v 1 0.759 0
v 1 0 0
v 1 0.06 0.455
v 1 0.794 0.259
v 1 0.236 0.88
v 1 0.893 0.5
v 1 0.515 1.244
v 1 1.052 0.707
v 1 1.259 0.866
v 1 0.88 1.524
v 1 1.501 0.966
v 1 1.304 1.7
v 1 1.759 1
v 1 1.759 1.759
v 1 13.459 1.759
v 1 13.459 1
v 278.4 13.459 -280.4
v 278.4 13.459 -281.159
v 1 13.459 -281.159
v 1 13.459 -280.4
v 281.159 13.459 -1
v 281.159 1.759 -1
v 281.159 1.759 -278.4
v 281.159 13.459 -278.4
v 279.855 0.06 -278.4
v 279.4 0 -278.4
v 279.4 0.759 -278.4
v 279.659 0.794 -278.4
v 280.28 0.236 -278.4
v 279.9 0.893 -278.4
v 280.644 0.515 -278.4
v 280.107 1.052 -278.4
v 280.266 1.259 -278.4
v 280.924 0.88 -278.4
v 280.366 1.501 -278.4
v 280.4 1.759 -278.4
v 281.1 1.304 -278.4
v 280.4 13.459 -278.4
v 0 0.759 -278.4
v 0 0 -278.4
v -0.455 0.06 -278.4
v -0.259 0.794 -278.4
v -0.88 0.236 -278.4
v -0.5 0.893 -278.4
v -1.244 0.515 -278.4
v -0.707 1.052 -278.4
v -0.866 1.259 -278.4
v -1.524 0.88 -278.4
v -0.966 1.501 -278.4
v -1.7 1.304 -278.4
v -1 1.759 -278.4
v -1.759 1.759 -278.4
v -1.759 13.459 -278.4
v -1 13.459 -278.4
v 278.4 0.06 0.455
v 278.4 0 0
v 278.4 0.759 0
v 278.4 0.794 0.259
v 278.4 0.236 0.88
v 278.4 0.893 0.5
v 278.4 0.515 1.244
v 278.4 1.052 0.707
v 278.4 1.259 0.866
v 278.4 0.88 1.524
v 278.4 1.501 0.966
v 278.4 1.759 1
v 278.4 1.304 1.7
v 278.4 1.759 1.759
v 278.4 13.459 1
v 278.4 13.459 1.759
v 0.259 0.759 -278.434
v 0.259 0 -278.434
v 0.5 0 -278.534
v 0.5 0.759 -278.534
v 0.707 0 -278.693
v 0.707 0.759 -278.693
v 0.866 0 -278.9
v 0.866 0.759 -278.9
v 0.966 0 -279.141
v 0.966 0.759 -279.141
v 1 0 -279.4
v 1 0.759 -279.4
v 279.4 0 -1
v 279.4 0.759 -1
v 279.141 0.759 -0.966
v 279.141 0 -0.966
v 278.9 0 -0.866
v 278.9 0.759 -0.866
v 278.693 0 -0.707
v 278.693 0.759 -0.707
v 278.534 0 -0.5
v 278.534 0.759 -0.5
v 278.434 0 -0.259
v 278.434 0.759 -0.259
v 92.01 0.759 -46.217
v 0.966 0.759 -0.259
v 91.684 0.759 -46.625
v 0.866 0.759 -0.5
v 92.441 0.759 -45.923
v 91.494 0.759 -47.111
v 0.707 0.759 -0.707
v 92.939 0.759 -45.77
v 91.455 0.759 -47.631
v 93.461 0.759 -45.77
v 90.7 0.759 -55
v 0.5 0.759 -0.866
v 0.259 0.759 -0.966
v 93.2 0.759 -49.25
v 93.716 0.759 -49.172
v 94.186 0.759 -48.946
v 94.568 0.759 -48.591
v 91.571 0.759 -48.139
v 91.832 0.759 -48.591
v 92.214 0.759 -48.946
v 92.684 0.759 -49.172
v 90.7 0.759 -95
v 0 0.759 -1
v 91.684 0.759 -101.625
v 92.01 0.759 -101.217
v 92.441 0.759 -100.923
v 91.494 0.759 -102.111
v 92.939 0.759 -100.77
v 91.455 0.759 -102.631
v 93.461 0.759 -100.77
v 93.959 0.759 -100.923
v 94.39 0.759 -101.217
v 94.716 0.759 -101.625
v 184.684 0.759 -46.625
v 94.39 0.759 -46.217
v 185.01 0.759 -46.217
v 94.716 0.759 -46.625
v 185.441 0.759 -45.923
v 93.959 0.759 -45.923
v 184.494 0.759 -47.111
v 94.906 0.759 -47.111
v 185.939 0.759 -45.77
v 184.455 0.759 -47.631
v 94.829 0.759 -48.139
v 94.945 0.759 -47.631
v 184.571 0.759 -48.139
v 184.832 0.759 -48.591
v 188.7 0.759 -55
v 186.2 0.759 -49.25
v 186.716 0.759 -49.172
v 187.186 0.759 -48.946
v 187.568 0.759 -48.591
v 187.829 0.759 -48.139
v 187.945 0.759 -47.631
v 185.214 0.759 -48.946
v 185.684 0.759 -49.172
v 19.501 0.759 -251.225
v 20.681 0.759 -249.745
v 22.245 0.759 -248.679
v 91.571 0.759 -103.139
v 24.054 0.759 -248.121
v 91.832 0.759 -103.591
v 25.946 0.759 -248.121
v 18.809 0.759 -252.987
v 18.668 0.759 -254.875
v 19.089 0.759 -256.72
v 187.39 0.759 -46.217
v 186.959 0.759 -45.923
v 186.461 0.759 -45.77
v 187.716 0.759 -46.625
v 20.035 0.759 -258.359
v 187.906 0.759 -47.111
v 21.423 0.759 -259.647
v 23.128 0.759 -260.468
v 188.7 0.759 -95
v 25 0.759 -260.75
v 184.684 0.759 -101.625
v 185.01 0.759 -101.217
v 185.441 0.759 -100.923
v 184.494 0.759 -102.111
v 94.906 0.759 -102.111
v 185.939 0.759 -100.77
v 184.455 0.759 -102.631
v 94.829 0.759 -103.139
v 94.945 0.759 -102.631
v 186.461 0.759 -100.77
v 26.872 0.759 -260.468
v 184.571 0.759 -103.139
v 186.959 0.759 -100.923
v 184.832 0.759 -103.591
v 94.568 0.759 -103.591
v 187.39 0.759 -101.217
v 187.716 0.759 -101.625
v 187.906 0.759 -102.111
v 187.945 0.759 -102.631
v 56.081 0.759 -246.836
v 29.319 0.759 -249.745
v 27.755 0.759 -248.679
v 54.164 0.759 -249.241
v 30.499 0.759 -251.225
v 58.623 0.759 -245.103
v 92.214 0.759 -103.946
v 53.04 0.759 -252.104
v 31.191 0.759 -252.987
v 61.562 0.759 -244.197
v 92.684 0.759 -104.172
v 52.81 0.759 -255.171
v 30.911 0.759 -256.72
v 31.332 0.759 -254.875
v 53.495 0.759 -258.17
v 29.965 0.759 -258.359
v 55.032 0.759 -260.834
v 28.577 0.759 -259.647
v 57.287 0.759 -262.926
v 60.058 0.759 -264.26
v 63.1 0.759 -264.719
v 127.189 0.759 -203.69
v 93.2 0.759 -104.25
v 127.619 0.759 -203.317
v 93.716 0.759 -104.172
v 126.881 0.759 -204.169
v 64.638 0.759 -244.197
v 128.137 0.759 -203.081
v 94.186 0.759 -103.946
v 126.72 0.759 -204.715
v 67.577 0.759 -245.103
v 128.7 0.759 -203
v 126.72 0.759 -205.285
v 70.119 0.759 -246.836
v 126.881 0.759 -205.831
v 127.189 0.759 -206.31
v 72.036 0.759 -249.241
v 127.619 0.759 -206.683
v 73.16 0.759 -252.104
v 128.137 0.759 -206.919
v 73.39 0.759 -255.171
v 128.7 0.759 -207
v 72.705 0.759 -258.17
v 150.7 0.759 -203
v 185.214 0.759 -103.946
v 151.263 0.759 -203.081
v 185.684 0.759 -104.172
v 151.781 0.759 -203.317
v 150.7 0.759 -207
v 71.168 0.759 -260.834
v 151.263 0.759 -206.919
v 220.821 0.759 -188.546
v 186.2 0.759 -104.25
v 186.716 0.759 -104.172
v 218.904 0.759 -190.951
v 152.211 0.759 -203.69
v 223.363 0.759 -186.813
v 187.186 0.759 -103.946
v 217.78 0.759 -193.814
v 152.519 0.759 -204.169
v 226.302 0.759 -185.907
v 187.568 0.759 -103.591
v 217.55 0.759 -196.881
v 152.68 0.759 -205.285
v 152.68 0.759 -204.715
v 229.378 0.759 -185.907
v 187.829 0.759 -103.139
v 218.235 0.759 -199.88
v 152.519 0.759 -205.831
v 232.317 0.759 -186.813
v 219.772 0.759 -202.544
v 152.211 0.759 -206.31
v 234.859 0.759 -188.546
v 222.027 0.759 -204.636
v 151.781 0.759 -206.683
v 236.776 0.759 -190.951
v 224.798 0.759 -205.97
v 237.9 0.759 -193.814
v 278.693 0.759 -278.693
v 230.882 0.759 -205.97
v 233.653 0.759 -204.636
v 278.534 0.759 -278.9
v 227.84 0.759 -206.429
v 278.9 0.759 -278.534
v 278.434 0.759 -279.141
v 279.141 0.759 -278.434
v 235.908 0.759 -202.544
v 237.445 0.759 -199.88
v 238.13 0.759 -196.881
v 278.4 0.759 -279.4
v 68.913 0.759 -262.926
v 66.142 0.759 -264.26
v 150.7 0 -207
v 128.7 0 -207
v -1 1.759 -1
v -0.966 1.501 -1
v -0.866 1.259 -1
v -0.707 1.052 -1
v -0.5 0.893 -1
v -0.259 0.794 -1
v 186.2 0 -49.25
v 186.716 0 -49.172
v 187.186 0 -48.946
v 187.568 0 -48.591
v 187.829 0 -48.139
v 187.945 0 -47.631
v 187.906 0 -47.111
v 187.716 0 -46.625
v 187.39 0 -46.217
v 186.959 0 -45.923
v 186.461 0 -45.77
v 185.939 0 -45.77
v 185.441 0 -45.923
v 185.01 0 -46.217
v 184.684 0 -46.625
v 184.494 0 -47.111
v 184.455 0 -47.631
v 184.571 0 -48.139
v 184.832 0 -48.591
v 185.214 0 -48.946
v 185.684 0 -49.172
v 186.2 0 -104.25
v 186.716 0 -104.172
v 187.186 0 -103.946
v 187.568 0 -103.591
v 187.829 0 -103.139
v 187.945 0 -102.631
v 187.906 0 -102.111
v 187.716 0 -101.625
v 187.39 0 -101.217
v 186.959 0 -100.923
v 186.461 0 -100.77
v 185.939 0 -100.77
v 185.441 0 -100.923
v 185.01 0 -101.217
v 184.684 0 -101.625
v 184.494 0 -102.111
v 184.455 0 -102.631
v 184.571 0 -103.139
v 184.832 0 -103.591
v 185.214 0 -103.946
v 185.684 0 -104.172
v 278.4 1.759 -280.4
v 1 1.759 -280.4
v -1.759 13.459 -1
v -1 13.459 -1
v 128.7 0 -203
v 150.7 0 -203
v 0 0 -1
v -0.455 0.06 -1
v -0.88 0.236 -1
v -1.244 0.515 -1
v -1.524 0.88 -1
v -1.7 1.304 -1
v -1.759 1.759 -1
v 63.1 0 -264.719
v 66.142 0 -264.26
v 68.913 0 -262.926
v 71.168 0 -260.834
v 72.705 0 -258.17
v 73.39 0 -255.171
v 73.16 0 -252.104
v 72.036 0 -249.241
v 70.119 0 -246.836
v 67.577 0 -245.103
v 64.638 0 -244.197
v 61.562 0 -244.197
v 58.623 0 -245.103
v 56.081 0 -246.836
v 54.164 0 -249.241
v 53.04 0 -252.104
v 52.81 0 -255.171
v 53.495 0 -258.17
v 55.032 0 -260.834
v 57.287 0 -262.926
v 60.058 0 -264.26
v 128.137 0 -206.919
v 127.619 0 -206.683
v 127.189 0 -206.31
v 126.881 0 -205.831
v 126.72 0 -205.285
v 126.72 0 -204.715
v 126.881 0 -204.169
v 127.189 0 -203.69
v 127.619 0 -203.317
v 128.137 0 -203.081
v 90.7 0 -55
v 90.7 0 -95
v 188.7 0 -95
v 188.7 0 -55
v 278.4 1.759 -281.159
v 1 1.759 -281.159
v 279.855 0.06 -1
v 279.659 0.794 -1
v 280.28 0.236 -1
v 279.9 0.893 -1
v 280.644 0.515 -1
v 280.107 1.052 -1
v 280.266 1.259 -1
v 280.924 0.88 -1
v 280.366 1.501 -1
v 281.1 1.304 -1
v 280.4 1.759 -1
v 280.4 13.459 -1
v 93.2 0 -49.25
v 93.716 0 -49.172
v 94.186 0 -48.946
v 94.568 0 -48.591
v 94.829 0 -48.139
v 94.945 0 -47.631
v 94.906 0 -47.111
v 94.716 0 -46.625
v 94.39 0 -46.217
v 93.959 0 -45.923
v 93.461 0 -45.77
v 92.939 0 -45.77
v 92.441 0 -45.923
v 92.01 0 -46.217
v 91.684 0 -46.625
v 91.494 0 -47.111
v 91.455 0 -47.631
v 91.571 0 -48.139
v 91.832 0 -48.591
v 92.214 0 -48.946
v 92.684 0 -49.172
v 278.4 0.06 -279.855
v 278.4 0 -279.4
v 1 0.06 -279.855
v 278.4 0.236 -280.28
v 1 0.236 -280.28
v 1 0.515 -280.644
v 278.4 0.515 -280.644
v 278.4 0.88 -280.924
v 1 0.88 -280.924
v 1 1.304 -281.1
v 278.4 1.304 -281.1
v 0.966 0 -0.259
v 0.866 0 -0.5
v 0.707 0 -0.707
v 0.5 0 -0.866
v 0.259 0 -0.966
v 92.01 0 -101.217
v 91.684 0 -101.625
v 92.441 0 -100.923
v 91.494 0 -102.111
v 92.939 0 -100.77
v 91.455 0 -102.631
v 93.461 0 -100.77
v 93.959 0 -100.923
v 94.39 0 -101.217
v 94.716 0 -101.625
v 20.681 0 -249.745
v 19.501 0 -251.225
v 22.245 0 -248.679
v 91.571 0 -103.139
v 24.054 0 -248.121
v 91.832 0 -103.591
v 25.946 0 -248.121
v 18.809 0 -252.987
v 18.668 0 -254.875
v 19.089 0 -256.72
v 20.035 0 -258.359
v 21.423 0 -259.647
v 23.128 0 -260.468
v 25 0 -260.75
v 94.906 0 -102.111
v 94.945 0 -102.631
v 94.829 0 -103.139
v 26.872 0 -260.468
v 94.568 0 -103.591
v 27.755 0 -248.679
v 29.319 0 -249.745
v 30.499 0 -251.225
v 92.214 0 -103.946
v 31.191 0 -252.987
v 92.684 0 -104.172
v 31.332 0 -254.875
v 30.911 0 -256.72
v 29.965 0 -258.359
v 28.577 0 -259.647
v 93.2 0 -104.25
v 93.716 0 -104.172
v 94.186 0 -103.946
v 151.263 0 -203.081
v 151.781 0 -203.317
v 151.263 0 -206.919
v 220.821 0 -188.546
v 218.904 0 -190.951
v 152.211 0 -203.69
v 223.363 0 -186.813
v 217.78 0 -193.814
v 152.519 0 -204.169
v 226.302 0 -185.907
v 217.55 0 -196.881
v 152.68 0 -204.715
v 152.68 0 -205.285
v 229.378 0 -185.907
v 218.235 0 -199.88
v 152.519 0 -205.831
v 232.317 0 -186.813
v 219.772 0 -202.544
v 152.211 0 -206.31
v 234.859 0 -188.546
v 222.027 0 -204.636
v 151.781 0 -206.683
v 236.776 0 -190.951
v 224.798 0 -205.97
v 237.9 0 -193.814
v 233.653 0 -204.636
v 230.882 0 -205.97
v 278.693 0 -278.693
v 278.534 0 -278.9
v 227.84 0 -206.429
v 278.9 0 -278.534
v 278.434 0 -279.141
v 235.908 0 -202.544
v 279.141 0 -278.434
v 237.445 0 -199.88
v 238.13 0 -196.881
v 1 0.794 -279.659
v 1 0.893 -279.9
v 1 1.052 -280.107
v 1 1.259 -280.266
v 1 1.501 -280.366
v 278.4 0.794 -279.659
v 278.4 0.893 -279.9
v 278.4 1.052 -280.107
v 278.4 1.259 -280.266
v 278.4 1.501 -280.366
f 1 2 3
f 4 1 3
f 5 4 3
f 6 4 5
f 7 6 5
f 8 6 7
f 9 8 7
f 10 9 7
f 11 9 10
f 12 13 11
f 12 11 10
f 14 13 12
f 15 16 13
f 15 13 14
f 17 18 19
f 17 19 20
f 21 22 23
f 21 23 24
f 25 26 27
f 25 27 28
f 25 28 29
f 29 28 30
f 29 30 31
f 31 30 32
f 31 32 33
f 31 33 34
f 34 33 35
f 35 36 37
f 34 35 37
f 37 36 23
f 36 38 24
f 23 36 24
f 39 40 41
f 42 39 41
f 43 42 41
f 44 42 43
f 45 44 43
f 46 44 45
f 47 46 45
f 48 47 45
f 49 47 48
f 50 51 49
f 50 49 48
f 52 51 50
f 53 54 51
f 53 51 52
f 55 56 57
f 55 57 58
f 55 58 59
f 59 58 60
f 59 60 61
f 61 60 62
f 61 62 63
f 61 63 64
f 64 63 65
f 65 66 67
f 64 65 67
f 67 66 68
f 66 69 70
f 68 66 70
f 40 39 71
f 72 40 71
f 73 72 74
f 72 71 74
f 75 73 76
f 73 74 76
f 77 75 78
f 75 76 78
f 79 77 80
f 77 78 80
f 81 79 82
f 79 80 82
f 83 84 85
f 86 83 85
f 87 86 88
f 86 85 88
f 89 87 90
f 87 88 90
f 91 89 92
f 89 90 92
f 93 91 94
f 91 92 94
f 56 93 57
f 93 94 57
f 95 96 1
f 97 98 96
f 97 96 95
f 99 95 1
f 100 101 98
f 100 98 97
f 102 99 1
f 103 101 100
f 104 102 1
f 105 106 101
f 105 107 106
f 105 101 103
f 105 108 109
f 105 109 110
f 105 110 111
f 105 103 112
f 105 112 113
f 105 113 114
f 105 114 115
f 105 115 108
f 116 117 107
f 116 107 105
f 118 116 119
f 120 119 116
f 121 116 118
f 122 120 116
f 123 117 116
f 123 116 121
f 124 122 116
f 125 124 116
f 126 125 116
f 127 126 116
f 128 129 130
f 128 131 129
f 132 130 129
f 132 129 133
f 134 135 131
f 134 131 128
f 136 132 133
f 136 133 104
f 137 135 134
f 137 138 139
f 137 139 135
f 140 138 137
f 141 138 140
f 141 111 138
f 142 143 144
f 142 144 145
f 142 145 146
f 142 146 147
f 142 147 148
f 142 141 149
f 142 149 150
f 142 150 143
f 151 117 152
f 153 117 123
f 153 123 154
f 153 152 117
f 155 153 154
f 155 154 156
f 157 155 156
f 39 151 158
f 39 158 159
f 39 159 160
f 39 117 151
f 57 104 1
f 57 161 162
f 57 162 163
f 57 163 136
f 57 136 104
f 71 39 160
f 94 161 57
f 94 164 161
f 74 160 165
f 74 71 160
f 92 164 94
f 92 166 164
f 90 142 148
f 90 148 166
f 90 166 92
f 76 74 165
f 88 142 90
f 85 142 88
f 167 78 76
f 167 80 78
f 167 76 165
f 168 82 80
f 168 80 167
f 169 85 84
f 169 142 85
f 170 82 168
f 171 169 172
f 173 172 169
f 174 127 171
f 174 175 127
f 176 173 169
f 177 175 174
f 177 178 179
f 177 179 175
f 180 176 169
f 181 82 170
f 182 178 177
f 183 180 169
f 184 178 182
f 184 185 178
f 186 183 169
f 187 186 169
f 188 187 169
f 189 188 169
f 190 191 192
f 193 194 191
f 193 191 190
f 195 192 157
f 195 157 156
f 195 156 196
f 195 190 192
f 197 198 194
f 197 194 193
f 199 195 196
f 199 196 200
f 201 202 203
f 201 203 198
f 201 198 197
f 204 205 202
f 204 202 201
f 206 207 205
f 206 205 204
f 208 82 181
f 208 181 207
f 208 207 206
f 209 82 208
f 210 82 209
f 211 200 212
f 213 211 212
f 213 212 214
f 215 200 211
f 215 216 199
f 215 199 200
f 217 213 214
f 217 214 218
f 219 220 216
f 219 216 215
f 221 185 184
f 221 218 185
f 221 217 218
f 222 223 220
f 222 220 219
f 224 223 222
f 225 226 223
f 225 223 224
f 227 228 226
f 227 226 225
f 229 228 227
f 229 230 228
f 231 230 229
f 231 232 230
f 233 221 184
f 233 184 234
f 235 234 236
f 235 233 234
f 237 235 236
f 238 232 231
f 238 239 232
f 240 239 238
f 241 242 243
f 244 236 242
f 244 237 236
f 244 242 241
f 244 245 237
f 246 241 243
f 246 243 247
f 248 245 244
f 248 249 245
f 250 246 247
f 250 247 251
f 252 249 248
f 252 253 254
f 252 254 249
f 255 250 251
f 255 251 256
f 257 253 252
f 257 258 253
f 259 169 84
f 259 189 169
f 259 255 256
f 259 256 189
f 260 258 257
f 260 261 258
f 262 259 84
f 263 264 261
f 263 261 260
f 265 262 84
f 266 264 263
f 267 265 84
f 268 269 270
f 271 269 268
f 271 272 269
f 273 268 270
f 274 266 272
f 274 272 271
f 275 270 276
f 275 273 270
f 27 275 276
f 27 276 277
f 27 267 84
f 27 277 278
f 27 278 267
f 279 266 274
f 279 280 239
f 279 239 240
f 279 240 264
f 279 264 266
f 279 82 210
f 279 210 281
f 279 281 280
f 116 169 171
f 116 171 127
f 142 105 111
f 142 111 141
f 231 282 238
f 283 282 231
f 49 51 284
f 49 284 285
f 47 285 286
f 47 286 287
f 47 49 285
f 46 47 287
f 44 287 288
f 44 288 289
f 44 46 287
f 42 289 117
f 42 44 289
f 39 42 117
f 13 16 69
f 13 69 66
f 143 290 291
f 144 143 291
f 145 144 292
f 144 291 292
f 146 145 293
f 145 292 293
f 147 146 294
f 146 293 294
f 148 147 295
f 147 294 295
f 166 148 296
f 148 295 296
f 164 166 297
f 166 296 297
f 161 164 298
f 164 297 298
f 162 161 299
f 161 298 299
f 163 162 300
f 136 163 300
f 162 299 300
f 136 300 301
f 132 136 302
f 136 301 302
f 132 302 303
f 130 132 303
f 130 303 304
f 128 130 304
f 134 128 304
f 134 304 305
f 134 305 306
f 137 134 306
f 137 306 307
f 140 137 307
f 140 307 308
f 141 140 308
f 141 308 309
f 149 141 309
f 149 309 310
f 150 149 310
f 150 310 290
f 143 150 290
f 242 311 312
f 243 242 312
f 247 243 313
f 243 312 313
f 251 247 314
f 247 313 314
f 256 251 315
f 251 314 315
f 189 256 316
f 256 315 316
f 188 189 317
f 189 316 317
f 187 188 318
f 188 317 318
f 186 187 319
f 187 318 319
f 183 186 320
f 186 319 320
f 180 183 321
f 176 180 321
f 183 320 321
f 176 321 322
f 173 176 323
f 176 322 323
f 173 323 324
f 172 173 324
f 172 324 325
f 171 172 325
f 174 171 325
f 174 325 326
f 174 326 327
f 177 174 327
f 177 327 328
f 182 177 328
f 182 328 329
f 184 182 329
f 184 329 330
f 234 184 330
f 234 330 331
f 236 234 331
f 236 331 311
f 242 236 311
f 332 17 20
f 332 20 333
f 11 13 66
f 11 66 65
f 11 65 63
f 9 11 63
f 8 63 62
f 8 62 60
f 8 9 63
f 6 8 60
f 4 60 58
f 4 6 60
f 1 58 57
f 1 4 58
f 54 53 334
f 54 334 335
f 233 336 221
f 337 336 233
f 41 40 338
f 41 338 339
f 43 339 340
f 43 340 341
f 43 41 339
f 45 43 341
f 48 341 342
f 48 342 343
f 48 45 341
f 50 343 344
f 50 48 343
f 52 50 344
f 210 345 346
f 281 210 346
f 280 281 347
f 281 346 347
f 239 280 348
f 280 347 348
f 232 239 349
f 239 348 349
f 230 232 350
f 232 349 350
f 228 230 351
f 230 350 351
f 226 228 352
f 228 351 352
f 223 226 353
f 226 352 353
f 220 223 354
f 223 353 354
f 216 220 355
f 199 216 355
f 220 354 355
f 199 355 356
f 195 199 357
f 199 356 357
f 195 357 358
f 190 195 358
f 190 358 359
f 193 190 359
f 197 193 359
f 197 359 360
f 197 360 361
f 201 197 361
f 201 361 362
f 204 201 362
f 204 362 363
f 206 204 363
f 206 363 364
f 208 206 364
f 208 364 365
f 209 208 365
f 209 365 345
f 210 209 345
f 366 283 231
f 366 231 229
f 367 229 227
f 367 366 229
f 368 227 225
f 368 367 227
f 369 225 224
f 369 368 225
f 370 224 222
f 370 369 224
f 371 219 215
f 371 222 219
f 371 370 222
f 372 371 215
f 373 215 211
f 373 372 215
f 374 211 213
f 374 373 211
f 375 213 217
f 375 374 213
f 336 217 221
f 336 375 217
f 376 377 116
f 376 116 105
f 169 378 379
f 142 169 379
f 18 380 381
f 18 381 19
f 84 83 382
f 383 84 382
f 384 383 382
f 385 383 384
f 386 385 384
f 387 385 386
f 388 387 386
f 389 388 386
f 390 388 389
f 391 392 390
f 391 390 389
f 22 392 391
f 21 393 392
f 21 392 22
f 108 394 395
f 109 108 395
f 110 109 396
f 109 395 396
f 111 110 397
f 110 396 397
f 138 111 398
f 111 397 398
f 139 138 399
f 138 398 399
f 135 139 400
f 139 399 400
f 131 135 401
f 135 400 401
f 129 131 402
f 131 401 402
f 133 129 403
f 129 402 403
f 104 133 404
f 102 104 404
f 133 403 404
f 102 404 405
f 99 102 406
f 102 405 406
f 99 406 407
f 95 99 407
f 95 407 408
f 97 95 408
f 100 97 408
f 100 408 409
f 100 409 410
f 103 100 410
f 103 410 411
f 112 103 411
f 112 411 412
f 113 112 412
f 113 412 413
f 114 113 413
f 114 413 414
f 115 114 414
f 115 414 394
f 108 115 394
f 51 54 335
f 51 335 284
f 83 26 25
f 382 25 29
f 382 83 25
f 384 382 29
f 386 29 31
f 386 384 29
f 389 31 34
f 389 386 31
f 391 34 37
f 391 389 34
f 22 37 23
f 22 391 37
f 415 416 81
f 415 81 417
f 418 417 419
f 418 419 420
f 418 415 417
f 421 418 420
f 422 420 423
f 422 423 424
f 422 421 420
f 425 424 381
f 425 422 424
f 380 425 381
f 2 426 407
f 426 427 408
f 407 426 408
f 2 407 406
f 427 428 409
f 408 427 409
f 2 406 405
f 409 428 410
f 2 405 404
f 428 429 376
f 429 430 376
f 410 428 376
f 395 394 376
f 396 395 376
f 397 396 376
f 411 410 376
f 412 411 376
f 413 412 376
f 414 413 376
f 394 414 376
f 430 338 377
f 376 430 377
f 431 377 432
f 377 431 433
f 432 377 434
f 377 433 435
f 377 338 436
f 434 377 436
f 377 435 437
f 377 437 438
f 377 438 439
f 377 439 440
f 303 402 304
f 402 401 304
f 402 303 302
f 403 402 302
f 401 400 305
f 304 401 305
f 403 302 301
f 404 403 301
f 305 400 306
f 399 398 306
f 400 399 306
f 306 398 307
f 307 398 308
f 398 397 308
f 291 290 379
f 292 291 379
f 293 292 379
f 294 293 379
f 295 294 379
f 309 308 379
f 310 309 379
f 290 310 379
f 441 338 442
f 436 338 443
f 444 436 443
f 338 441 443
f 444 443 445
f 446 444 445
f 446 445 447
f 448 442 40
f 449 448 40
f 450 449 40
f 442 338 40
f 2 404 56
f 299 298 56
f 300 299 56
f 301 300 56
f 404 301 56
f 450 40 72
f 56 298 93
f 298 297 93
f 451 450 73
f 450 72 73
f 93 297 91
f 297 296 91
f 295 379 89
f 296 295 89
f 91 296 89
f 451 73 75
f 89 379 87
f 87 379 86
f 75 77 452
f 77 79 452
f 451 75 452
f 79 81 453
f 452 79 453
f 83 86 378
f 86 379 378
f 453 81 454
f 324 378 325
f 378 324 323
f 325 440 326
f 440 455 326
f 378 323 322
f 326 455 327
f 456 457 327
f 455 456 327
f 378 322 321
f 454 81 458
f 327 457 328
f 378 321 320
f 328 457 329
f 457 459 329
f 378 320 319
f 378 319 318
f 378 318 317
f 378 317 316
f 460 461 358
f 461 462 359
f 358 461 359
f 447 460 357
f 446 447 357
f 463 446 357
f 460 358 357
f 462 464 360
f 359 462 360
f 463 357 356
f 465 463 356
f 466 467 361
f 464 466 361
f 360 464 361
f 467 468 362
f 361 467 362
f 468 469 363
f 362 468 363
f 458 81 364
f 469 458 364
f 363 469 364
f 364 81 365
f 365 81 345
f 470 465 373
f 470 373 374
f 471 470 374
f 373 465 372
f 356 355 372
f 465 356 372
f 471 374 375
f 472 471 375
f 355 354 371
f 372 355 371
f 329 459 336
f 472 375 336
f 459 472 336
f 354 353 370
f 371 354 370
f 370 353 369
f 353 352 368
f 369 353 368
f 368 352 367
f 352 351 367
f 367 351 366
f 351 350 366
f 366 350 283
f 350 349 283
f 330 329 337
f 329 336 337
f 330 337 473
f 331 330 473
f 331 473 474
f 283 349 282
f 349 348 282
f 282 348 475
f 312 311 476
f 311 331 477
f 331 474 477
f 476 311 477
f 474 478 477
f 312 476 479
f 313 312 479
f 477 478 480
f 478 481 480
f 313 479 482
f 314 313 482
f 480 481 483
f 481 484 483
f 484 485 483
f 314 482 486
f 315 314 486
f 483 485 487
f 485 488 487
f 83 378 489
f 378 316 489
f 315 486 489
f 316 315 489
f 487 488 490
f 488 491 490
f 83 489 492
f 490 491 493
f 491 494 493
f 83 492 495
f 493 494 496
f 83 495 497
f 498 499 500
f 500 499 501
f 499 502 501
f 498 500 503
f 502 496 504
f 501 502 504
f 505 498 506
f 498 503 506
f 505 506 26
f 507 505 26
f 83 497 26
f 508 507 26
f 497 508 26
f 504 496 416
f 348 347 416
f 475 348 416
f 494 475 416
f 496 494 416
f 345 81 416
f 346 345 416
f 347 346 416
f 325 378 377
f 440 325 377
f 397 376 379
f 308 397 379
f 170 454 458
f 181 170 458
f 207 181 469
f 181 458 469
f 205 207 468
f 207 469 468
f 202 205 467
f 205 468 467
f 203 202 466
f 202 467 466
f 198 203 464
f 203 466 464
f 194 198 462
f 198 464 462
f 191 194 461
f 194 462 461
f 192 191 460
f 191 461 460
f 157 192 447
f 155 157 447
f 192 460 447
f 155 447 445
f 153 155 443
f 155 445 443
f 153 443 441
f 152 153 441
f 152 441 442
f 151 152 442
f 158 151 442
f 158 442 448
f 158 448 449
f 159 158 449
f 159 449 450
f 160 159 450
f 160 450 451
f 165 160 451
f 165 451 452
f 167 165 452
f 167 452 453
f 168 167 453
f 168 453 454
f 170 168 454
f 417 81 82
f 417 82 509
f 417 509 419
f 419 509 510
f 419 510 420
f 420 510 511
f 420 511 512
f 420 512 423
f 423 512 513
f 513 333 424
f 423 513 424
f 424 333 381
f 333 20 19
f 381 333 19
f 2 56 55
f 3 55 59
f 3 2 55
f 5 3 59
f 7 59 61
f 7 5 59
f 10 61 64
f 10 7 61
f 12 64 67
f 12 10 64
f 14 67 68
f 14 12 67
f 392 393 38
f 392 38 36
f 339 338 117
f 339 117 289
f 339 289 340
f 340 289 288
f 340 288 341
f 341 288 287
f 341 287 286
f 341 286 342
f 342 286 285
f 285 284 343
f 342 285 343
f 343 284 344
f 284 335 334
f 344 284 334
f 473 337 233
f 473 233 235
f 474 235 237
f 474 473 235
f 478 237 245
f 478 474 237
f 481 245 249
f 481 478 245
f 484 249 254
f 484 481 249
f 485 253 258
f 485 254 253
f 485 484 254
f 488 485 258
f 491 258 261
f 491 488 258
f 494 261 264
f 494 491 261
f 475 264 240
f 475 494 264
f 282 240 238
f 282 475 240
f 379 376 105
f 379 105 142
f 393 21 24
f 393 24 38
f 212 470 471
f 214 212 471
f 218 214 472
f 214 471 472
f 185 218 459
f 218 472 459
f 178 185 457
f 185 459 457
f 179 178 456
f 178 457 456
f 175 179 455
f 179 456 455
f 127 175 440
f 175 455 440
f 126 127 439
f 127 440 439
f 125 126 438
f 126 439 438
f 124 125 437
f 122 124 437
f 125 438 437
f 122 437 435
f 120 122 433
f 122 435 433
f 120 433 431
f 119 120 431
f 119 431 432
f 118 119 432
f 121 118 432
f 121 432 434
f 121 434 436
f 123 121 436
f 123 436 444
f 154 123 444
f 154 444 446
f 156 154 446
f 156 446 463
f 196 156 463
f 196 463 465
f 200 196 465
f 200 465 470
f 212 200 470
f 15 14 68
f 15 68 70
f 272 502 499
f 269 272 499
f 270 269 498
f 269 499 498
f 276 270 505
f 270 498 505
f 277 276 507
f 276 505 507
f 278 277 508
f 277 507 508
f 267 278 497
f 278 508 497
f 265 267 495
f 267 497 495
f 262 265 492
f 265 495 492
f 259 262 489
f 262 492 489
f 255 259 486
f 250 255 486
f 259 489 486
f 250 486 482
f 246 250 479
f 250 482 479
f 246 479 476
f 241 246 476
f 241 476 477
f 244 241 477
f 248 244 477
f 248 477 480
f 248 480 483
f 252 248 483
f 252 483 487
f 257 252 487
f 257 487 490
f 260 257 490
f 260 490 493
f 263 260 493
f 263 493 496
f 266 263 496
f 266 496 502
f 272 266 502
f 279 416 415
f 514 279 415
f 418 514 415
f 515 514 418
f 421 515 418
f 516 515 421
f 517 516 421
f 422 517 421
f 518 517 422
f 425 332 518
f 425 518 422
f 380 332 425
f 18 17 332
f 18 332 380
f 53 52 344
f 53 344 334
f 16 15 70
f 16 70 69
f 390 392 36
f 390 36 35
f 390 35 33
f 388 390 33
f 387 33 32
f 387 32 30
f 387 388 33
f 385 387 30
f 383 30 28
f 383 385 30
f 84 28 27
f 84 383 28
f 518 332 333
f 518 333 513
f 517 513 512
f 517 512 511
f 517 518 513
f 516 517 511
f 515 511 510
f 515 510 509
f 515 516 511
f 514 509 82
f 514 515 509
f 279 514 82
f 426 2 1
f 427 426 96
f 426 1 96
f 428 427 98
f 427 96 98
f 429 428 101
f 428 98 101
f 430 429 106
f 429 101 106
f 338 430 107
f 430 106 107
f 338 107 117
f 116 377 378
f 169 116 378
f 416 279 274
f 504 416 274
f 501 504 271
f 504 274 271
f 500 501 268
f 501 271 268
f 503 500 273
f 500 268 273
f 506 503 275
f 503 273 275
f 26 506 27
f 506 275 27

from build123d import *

# Parameters (mm, degrees)
SKETCH1_W                 = 279.4
SKETCH1_H                 = 279.4
BASE_FLANGE1_DEPTH        = 0.75946
SKETCH4_R                 = 1
CUT_EXTRUDE1_DEPTH        = 396.131999184
EDGE_FLANGE1_DEPTH        = 277.4
EDGE_FLANGE1_BEND_DEPTH   = 277.4
EDGE_FLANGE1_BEND_2_DEPTH = 277.4
EDGE_FLANGE1_BEND_3_DEPTH = 277.4
CUT_EXTRUDE2_REACH        = 399.847
SKETCH17_R                = 6.35
SKETCH17_R_2              = 10.31875
SKETCH17_W                = 98
SKETCH17_H                = 40
SKETCH19_R                = 1.75
CUT_EXTRUDE4_DEPTH        = 398.847258327


# Sheet-metal steps are written as plain solids
with BuildPart() as part:
    # Sketch1 → Base-Flange1 (new body)
    with BuildSketch(Plane(origin=(0, 0, 0), x_dir=(1, 0, 0), z_dir=(0, 1, 0))):
        with Locations((139.7, 139.7)):
            Rectangle(SKETCH1_W, SKETCH1_H)
    extrude(amount=BASE_FLANGE1_DEPTH)

    # Sketch4 → Cut-Extrude1 (cut, through all)
    with BuildSketch(Plane(origin=(0, 0.75946, 0), x_dir=(1, 0, 0), z_dir=(0, 1, 0))):
        Circle(SKETCH4_R)
        with Locations((0, 279.4)):
            Circle(SKETCH4_R)
        with Locations((279.4, 279.4)):
            Circle(SKETCH4_R)
        with Locations((279.4, 0)):
            Circle(SKETCH4_R)
    extrude(amount=-CUT_EXTRUDE1_DEPTH, mode=Mode.SUBTRACT)

    # Edge-Flange1 section (across the edge) → Edge-Flange1 (add)
    with BuildSketch(Plane(origin=(278.4, 0.75946, -280.4), x_dir=(0, 0, 1), z_dir=(-1, 0, 0))):
        with BuildLine():
            Line((-0.75946, 1), (-0.75946, 12.7))
            Line((-0.75946, 12.7), (0, 12.7))
            Line((0, 12.7), (0, 1))
            ThreePointArc((0, 1), (0.292893219, 0.292893219), (1, 0))
            Line((1, 0), (1, -0.75946))
            ThreePointArc((1, -0.75946), (-0.244126097, -0.244126097), (-0.75946, 1))
        make_face()
    extrude(amount=EDGE_FLANGE1_DEPTH)

    # Edge-Flange1 section 2 (across the edge) → Edge-Flange1 bend (add)
    with BuildSketch(Plane(origin=(-1, 0.75946, -278.4), x_dir=(1, 0, 0), z_dir=(0, 0, 1))):
        with BuildLine():
            Line((-0.75946, 1), (-0.75946, 12.7))
            Line((-0.75946, 12.7), (0, 12.7))
            Line((0, 12.7), (0, 1))
            ThreePointArc((0, 1), (0.292893219, 0.292893219), (1, 0))
            Line((1, 0), (1, -0.75946))
            ThreePointArc((1, -0.75946), (-0.244126097, -0.244126097), (-0.75946, 1))
        make_face()
    extrude(amount=EDGE_FLANGE1_BEND_DEPTH)

    # Edge-Flange1 section 3 (across the edge) → Edge-Flange1 bend 2 (add)
    with BuildSketch(Plane(origin=(1, 0.75946, 1), x_dir=(0, 0, -1), z_dir=(1, 0, 0))):
        with BuildLine():
            Line((-0.75946, 1), (-0.75946, 12.7))
            Line((-0.75946, 12.7), (0, 12.7))
            Line((0, 12.7), (0, 1))
            ThreePointArc((0, 1), (0.292893219, 0.292893219), (1, 0))
            Line((1, 0), (1, -0.75946))
            ThreePointArc((1, -0.75946), (-0.244126097, -0.244126097), (-0.75946, 1))
        make_face()
    extrude(amount=EDGE_FLANGE1_BEND_2_DEPTH)

    # Edge-Flange1 section 4 (across the edge) → Edge-Flange1 bend 3 (add)
    with BuildSketch(Plane(origin=(280.4, 0.75946, -1), x_dir=(-1, 0, 0), z_dir=(0, 0, -1))):
        with BuildLine():
            Line((-0.75946, 1), (-0.75946, 12.7))
            Line((-0.75946, 12.7), (0, 12.7))
            Line((0, 12.7), (0, 1))
            ThreePointArc((0, 1), (0.292893219, 0.292893219), (1, 0))
            Line((1, 0), (1, -0.75946))
            ThreePointArc((1, -0.75946), (-0.244126097, -0.244126097), (-0.75946, 1))
        make_face()
    extrude(amount=EDGE_FLANGE1_BEND_3_DEPTH)

    # Sketch17 → Cut-Extrude2 (cut, up to next)
    with BuildSketch(Plane.XZ, mode=Mode.PRIVATE) as cut_extrude2_sk1:
        with Locations(Location((25, -254.4, 0), (0, 0, 270))):
            Circle(SKETCH17_R)
    cut_extrude2_tool1 = extrude(cut_extrude2_sk1.sketch, amount=-CUT_EXTRUDE2_REACH, mode=Mode.PRIVATE) & part.part
    # Sketch17 → Cut-Extrude2 (cut, up to next)
    with BuildSketch(Plane.XZ, mode=Mode.PRIVATE) as cut_extrude2_sk2:
        with Locations(Location((63.1, -254.4, 0), (0, 0, 270))):
            Circle(SKETCH17_R_2)
    cut_extrude2_tool2 = extrude(cut_extrude2_sk2.sketch, amount=-CUT_EXTRUDE2_REACH, mode=Mode.PRIVATE) & part.part
    # Sketch17 → Cut-Extrude2 (cut, up to next)
    with BuildSketch(Plane.XZ, mode=Mode.PRIVATE) as cut_extrude2_sk3:
        with Locations(Location((227.84, -196.11, 0), (0, 0, 270))):
            Circle(SKETCH17_R_2)
    cut_extrude2_tool3 = extrude(cut_extrude2_sk3.sketch, amount=-CUT_EXTRUDE2_REACH, mode=Mode.PRIVATE) & part.part
    # Sketch17 → Cut-Extrude2 (cut, up to next)
    with BuildSketch(Plane.XZ, mode=Mode.PRIVATE) as cut_extrude2_sk4:
        with Locations((139.7, -75)):
            Rectangle(SKETCH17_W, SKETCH17_H)
    cut_extrude2_tool4 = extrude(cut_extrude2_sk4.sketch, amount=-CUT_EXTRUDE2_REACH, mode=Mode.PRIVATE) & part.part
    # Sketch17 → Cut-Extrude2 (cut, up to next)
    with BuildSketch(Plane.XZ, mode=Mode.PRIVATE) as cut_extrude2_sk5:
        with BuildLine():
            Line((128.7, -203), (150.7, -203))
            ThreePointArc((150.7, -203), (152.7, -205), (150.7, -207))
            Line((150.7, -207), (128.7, -207))
            ThreePointArc((128.7, -207), (126.7, -205), (128.7, -203))
        make_face()
    cut_extrude2_tool5 = extrude(cut_extrude2_sk5.sketch, amount=-CUT_EXTRUDE2_REACH, mode=Mode.PRIVATE) & part.part
    add(cut_extrude2_tool1.solids().sort_by_distance((25, 0, -254.4))[0], mode=Mode.SUBTRACT)
    add(cut_extrude2_tool2.solids().sort_by_distance((63.1, 0, -254.4))[0], mode=Mode.SUBTRACT)
    add(cut_extrude2_tool3.solids().sort_by_distance((227.84, 0, -196.11))[0], mode=Mode.SUBTRACT)
    add(cut_extrude2_tool4.solids().sort_by_distance((139.7, 0, -75))[0], mode=Mode.SUBTRACT)
    add(cut_extrude2_tool5.solids().sort_by_distance((139.7, 0, -205))[0], mode=Mode.SUBTRACT)

    # Sketch19 → Cut-Extrude4 (cut, through all)
    with BuildSketch(Plane.XZ):
        with Locations(Location((93.2, -47.5, 0), (0, 0, 270))):
            Circle(SKETCH19_R)
        with Locations(Location((186.2, -47.5, 0), (0, 0, 270))):
            Circle(SKETCH19_R)
        with Locations(Location((186.2, -102.5, 0), (0, 0, 270))):
            Circle(SKETCH19_R)
        with Locations(Location((93.2, -102.5, 0), (0, 0, 270))):
            Circle(SKETCH19_R)
    extrude(amount=-CUT_EXTRUDE4_DEPTH, mode=Mode.SUBTRACT)


solid = part.part
